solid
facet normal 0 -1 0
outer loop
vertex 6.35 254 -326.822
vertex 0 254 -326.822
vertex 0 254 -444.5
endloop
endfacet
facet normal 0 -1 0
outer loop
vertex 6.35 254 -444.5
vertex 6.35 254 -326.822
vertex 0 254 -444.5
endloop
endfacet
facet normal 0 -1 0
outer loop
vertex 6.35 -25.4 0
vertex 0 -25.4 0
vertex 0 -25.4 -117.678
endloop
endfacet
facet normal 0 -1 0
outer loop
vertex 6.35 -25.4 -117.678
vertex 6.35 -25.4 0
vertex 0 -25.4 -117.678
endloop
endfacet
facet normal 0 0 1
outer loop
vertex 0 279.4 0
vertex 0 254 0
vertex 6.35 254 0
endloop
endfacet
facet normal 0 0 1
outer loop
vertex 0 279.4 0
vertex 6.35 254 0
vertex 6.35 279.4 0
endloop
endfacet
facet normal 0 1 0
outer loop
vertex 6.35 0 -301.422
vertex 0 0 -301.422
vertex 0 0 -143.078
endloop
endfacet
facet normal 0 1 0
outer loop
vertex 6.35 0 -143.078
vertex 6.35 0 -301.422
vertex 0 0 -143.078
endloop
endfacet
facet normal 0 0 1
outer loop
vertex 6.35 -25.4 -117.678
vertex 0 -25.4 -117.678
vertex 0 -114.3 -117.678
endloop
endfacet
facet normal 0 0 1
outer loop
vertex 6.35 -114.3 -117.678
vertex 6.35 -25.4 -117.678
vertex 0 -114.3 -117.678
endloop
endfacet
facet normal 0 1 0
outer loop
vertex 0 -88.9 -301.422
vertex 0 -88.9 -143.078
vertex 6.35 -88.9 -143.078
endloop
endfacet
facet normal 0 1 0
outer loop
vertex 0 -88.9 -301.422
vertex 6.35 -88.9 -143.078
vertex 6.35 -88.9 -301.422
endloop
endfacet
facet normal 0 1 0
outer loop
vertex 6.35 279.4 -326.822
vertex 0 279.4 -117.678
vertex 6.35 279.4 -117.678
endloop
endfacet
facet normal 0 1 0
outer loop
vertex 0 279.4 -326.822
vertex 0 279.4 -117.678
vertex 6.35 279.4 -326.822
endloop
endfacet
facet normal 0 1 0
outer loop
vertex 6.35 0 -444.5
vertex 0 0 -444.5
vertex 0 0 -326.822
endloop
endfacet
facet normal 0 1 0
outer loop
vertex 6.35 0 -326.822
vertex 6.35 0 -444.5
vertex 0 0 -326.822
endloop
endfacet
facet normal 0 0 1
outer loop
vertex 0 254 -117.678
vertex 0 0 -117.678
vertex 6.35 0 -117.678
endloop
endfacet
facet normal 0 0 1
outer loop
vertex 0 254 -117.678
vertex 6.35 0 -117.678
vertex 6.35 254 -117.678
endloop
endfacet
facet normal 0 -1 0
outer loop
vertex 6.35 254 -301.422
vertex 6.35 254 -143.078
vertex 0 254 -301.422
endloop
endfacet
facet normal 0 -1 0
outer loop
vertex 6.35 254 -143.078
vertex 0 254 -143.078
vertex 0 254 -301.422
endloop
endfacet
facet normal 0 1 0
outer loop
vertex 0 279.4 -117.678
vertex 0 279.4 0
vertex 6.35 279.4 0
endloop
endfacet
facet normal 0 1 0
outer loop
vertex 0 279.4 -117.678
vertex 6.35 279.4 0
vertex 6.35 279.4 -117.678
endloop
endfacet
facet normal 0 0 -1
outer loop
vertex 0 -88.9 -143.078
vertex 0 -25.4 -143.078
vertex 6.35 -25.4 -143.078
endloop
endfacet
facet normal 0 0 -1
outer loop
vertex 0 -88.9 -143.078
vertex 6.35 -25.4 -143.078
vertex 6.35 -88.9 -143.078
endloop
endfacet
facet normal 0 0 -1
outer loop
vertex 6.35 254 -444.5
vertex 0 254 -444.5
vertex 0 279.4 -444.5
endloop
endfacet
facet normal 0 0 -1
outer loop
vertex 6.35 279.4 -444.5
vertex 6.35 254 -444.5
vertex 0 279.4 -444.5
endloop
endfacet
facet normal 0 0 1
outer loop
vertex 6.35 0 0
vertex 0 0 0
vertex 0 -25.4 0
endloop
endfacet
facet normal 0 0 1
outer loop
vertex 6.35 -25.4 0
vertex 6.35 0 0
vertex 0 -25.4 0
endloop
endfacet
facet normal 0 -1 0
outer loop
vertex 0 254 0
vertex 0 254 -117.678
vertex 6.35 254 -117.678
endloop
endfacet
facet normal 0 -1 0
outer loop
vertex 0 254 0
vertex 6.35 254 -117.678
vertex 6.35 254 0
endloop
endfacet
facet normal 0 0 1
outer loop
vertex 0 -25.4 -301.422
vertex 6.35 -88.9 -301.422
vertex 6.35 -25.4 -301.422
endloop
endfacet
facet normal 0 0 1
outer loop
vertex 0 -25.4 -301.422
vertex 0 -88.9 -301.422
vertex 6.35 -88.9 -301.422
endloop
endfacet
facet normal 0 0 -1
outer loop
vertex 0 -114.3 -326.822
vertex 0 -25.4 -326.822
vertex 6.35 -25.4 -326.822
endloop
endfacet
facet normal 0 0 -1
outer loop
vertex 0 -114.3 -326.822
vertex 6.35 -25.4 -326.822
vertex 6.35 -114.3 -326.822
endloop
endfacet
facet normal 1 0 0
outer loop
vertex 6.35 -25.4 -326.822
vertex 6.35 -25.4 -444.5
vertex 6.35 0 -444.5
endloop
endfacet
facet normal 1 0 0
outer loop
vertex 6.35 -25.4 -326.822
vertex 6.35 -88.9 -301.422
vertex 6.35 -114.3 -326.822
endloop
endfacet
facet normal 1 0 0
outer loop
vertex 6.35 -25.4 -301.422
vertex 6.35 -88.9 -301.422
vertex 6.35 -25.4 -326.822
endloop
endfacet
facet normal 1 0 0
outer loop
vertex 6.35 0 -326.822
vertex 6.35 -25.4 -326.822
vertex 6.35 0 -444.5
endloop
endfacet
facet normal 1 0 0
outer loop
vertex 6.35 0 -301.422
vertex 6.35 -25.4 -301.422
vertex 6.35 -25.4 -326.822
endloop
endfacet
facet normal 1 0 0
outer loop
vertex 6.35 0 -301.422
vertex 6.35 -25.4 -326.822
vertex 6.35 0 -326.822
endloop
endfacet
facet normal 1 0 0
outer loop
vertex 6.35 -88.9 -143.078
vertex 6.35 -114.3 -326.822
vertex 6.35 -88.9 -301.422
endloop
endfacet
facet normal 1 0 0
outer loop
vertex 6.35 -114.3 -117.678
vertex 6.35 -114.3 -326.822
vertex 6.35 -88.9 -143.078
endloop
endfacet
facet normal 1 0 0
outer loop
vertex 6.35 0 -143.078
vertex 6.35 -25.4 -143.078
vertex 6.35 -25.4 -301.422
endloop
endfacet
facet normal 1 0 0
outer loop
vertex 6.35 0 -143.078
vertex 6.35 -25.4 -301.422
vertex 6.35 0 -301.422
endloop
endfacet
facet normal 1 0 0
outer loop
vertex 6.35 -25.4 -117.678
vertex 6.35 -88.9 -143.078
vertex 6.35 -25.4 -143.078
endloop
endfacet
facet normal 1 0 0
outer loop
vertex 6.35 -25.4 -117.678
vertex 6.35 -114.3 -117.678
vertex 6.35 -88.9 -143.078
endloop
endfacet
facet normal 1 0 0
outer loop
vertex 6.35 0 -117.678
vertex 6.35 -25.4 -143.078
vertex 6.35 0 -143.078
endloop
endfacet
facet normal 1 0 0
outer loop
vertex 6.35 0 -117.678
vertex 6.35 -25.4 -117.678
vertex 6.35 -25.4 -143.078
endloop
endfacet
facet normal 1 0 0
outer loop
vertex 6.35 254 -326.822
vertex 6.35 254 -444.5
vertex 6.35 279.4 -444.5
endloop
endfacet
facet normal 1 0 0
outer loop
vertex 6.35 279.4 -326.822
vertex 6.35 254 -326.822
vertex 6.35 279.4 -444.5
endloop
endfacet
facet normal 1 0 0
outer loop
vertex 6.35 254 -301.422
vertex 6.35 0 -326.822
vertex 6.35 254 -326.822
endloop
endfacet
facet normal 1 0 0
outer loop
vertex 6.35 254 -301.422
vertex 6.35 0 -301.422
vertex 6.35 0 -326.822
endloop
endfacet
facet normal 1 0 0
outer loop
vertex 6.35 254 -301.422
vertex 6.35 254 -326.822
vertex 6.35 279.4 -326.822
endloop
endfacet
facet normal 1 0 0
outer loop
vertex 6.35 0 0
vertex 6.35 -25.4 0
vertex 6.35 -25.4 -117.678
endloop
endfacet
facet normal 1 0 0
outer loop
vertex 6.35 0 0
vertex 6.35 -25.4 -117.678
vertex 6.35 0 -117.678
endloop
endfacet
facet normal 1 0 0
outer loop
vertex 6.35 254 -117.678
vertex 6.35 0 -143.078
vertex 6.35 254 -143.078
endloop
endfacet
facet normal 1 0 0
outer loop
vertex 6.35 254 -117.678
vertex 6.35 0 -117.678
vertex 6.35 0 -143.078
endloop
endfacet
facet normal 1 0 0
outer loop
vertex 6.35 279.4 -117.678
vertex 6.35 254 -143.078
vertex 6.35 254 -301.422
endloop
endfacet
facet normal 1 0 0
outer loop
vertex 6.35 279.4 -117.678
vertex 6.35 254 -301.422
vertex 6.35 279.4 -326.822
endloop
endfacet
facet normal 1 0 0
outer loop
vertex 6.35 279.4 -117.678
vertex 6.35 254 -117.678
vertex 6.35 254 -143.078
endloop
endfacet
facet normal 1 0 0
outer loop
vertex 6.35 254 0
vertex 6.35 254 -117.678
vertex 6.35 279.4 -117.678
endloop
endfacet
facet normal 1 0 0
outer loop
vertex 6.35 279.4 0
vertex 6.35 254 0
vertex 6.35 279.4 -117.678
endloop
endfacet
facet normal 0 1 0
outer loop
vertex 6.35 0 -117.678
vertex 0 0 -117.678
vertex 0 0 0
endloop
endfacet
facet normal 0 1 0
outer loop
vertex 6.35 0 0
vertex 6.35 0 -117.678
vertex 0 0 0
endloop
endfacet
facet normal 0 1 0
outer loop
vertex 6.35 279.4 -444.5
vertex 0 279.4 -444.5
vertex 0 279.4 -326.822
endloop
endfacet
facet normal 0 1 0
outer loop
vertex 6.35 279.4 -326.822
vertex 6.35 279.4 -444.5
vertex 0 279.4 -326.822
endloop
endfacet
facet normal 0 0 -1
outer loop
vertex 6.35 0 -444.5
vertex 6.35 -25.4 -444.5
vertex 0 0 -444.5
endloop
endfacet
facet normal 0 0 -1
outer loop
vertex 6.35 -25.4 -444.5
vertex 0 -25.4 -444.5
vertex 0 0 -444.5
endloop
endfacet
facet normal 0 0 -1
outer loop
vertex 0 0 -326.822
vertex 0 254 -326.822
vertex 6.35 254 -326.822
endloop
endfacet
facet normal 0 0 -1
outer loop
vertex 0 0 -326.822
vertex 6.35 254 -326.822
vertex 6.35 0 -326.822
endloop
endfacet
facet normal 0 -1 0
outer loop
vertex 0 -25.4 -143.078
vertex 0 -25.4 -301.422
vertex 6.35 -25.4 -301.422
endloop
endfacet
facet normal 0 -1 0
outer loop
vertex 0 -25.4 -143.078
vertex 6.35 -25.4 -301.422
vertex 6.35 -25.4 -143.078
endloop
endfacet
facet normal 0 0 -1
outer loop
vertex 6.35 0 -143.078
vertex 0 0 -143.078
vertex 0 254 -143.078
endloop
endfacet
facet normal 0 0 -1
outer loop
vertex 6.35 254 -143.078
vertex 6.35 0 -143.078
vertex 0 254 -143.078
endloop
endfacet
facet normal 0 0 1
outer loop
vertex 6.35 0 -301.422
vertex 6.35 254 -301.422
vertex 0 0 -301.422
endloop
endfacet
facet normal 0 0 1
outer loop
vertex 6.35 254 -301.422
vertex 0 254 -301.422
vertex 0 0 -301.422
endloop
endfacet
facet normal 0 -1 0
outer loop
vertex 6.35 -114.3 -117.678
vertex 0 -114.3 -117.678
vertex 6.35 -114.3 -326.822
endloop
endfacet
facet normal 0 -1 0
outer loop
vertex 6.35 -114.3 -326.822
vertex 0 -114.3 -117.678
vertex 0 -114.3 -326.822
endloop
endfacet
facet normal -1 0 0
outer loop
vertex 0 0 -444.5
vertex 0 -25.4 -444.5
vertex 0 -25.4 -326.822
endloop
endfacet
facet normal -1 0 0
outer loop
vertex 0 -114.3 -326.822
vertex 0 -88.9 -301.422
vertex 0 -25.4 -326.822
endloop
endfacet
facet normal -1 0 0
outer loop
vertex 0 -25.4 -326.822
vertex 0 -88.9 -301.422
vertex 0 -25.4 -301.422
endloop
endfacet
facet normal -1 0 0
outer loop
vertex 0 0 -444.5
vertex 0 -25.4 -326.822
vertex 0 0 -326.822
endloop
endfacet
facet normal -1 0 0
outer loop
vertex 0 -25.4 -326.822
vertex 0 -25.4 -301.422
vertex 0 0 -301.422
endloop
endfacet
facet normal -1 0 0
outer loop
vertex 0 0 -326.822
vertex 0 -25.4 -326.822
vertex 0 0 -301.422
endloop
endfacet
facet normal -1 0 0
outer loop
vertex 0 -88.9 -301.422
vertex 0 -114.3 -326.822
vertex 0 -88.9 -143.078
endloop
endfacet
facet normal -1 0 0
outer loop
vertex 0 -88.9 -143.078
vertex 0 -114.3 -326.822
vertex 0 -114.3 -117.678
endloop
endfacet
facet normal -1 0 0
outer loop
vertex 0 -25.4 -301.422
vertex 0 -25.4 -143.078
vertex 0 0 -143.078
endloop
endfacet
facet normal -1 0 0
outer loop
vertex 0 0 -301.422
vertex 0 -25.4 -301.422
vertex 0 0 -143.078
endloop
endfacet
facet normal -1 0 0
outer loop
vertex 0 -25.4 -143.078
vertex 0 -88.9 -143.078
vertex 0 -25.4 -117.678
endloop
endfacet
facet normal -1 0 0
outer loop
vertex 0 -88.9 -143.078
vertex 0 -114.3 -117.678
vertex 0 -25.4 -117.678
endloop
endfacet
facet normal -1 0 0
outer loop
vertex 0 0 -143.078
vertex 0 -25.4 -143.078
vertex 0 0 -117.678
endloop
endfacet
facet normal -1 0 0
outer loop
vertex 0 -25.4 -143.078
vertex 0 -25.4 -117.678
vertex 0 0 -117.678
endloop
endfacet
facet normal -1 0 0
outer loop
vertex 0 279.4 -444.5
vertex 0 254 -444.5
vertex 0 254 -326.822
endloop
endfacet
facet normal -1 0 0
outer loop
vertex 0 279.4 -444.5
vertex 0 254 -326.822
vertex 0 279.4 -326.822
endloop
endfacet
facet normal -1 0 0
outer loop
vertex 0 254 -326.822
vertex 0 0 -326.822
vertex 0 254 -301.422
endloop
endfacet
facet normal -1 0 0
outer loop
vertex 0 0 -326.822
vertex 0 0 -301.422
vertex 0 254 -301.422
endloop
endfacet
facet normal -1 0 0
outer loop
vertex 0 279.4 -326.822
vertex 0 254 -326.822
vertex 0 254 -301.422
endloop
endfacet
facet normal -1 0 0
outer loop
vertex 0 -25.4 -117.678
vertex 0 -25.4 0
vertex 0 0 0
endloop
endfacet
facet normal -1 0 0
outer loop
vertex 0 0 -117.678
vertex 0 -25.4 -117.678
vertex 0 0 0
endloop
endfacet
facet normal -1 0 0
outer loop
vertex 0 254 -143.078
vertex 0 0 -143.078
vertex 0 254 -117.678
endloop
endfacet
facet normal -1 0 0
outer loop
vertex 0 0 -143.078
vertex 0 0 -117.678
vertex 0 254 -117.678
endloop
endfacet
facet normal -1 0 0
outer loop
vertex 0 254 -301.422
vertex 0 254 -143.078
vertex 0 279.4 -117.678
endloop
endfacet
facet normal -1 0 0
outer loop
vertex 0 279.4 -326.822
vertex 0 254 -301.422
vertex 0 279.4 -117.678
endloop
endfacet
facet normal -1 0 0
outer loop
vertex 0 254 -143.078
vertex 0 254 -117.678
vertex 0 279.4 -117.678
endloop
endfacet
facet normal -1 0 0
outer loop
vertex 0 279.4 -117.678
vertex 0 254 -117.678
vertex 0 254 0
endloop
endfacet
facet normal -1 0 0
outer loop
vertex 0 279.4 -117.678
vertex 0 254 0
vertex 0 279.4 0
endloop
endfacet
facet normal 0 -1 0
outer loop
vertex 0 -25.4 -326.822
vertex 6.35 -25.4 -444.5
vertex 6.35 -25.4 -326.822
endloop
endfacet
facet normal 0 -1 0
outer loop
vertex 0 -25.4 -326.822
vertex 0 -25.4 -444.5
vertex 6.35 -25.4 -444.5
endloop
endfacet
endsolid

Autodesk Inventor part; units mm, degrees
ref_plane "YZ Plane" through (0, 0, 0) normal (1, 0, 0) x (0, 1, 0)
ref_plane "XZ Plane" through (0, 0, 0) normal (0, 1, 0) x (-1, 0, 0)
ref_plane "XY Plane" through (0, 0, 0) normal (0, 0, 1) x (1, 0, 0)
sketch "Sketch1" plane through (0, 0, 0) normal (1, 0, 0) x (0, 1, 0)
  line L0 (0, 0) -> (-114.3, 0)
  line L1 (-114.3, 0) -> (-114.3, -444.5)
  line L2 (-114.3, -444.5) -> (0, -444.5)
  line L3 (-114.3, 0) -> (-25.4, 0)
  line L4 (-25.4, 0) -> (-25.4, -117.6782)
  line L5 (-25.4, -117.6782) -> (-114.3, -117.6782)
  line L6 (-114.3, -117.6782) -> (-114.3, 0)
  line L7 (-114.3, -444.5) -> (-25.4, -444.5)
  line L8 (-25.4, -444.5) -> (-25.4, -326.8218)
  line L9 (-25.4, -326.8218) -> (-114.3, -326.8218)
  line L10 (-114.3, -326.8218) -> (-114.3, -444.5)
  line L11 (-25.4, -143.0782) -> (-88.9, -143.0782)
  line L12 (-88.9, -143.0782) -> (-88.9, -301.4218)
  line L13 (-88.9, -301.4218) -> (-25.4, -301.4218)
  line L14 (-25.4, -301.4218) -> (-25.4, -143.0782)
  line L15 (279.4, -117.6782) -> (279.4, -326.8218)
  line L16 (-114.3, -326.8218) -> (-114.3, -117.6782)
  line L17 (0, -143.0782) -> (254, -143.0782)
  line L18 (254, -143.0782) -> (254, -301.4218)
  line L19 (254, -301.4218) -> (0, -301.4218)
  line L20 (0, -301.4218) -> (0, -143.0782)
  line L21 (0, -117.6782) -> (0, 0)
  line L22 (0, -444.5) -> (0, -326.8218)
  line L23 (0, -301.4218) -> (0, -143.0782)
  line L24 (-114.3, -117.6782) -> (-25.4, -117.6782)
  line L25 (0, -117.6782) -> (254, -117.6782)
  line L26 (254, -326.8218) -> (0, -326.8218)
  line L27 (-25.4, -326.8218) -> (-114.3, -326.8218)
  line L28 (254, -326.8218) -> (254, -444.5)
  line L29 (254, -444.5) -> (279.4, -444.5)
  line L30 (279.4, -444.5) -> (279.4, -326.8218)
  line L31 (254, -117.6782) -> (254, 0)
  line L32 (254, 0) -> (279.4, 0)
  line L33 (279.4, 0) -> (279.4, -117.6782)
  dimension "d0" = 114.3
  dimension "d1" = 444.5
  dimension "d2" = 88.9
  dimension "d3" = 209.1436
  dimension "d4" = 117.6782
  dimension "d9" = 63.5
  dimension "d10" = 158.3436
  dimension "d11" = 25.4
  dimension "d12" = 25.4
  dimension "d16" = 254
  dimension "d24" = 117.6782
  dimension "d25" = 25.4
  dimension "d26" = 117.6782
  dimension "d27" = 25.4
  dimension "d28" = 393.7
extrude "Extrusion2" add sketch "Sketch1" along normal blind 6.35 contours L21 L25 L31 L32 L33 L15 L30 L29 L28 L26 L22 L2 L8 L9 L1 L5 L4 L0
properties part number "CapBallLiftBacking"
